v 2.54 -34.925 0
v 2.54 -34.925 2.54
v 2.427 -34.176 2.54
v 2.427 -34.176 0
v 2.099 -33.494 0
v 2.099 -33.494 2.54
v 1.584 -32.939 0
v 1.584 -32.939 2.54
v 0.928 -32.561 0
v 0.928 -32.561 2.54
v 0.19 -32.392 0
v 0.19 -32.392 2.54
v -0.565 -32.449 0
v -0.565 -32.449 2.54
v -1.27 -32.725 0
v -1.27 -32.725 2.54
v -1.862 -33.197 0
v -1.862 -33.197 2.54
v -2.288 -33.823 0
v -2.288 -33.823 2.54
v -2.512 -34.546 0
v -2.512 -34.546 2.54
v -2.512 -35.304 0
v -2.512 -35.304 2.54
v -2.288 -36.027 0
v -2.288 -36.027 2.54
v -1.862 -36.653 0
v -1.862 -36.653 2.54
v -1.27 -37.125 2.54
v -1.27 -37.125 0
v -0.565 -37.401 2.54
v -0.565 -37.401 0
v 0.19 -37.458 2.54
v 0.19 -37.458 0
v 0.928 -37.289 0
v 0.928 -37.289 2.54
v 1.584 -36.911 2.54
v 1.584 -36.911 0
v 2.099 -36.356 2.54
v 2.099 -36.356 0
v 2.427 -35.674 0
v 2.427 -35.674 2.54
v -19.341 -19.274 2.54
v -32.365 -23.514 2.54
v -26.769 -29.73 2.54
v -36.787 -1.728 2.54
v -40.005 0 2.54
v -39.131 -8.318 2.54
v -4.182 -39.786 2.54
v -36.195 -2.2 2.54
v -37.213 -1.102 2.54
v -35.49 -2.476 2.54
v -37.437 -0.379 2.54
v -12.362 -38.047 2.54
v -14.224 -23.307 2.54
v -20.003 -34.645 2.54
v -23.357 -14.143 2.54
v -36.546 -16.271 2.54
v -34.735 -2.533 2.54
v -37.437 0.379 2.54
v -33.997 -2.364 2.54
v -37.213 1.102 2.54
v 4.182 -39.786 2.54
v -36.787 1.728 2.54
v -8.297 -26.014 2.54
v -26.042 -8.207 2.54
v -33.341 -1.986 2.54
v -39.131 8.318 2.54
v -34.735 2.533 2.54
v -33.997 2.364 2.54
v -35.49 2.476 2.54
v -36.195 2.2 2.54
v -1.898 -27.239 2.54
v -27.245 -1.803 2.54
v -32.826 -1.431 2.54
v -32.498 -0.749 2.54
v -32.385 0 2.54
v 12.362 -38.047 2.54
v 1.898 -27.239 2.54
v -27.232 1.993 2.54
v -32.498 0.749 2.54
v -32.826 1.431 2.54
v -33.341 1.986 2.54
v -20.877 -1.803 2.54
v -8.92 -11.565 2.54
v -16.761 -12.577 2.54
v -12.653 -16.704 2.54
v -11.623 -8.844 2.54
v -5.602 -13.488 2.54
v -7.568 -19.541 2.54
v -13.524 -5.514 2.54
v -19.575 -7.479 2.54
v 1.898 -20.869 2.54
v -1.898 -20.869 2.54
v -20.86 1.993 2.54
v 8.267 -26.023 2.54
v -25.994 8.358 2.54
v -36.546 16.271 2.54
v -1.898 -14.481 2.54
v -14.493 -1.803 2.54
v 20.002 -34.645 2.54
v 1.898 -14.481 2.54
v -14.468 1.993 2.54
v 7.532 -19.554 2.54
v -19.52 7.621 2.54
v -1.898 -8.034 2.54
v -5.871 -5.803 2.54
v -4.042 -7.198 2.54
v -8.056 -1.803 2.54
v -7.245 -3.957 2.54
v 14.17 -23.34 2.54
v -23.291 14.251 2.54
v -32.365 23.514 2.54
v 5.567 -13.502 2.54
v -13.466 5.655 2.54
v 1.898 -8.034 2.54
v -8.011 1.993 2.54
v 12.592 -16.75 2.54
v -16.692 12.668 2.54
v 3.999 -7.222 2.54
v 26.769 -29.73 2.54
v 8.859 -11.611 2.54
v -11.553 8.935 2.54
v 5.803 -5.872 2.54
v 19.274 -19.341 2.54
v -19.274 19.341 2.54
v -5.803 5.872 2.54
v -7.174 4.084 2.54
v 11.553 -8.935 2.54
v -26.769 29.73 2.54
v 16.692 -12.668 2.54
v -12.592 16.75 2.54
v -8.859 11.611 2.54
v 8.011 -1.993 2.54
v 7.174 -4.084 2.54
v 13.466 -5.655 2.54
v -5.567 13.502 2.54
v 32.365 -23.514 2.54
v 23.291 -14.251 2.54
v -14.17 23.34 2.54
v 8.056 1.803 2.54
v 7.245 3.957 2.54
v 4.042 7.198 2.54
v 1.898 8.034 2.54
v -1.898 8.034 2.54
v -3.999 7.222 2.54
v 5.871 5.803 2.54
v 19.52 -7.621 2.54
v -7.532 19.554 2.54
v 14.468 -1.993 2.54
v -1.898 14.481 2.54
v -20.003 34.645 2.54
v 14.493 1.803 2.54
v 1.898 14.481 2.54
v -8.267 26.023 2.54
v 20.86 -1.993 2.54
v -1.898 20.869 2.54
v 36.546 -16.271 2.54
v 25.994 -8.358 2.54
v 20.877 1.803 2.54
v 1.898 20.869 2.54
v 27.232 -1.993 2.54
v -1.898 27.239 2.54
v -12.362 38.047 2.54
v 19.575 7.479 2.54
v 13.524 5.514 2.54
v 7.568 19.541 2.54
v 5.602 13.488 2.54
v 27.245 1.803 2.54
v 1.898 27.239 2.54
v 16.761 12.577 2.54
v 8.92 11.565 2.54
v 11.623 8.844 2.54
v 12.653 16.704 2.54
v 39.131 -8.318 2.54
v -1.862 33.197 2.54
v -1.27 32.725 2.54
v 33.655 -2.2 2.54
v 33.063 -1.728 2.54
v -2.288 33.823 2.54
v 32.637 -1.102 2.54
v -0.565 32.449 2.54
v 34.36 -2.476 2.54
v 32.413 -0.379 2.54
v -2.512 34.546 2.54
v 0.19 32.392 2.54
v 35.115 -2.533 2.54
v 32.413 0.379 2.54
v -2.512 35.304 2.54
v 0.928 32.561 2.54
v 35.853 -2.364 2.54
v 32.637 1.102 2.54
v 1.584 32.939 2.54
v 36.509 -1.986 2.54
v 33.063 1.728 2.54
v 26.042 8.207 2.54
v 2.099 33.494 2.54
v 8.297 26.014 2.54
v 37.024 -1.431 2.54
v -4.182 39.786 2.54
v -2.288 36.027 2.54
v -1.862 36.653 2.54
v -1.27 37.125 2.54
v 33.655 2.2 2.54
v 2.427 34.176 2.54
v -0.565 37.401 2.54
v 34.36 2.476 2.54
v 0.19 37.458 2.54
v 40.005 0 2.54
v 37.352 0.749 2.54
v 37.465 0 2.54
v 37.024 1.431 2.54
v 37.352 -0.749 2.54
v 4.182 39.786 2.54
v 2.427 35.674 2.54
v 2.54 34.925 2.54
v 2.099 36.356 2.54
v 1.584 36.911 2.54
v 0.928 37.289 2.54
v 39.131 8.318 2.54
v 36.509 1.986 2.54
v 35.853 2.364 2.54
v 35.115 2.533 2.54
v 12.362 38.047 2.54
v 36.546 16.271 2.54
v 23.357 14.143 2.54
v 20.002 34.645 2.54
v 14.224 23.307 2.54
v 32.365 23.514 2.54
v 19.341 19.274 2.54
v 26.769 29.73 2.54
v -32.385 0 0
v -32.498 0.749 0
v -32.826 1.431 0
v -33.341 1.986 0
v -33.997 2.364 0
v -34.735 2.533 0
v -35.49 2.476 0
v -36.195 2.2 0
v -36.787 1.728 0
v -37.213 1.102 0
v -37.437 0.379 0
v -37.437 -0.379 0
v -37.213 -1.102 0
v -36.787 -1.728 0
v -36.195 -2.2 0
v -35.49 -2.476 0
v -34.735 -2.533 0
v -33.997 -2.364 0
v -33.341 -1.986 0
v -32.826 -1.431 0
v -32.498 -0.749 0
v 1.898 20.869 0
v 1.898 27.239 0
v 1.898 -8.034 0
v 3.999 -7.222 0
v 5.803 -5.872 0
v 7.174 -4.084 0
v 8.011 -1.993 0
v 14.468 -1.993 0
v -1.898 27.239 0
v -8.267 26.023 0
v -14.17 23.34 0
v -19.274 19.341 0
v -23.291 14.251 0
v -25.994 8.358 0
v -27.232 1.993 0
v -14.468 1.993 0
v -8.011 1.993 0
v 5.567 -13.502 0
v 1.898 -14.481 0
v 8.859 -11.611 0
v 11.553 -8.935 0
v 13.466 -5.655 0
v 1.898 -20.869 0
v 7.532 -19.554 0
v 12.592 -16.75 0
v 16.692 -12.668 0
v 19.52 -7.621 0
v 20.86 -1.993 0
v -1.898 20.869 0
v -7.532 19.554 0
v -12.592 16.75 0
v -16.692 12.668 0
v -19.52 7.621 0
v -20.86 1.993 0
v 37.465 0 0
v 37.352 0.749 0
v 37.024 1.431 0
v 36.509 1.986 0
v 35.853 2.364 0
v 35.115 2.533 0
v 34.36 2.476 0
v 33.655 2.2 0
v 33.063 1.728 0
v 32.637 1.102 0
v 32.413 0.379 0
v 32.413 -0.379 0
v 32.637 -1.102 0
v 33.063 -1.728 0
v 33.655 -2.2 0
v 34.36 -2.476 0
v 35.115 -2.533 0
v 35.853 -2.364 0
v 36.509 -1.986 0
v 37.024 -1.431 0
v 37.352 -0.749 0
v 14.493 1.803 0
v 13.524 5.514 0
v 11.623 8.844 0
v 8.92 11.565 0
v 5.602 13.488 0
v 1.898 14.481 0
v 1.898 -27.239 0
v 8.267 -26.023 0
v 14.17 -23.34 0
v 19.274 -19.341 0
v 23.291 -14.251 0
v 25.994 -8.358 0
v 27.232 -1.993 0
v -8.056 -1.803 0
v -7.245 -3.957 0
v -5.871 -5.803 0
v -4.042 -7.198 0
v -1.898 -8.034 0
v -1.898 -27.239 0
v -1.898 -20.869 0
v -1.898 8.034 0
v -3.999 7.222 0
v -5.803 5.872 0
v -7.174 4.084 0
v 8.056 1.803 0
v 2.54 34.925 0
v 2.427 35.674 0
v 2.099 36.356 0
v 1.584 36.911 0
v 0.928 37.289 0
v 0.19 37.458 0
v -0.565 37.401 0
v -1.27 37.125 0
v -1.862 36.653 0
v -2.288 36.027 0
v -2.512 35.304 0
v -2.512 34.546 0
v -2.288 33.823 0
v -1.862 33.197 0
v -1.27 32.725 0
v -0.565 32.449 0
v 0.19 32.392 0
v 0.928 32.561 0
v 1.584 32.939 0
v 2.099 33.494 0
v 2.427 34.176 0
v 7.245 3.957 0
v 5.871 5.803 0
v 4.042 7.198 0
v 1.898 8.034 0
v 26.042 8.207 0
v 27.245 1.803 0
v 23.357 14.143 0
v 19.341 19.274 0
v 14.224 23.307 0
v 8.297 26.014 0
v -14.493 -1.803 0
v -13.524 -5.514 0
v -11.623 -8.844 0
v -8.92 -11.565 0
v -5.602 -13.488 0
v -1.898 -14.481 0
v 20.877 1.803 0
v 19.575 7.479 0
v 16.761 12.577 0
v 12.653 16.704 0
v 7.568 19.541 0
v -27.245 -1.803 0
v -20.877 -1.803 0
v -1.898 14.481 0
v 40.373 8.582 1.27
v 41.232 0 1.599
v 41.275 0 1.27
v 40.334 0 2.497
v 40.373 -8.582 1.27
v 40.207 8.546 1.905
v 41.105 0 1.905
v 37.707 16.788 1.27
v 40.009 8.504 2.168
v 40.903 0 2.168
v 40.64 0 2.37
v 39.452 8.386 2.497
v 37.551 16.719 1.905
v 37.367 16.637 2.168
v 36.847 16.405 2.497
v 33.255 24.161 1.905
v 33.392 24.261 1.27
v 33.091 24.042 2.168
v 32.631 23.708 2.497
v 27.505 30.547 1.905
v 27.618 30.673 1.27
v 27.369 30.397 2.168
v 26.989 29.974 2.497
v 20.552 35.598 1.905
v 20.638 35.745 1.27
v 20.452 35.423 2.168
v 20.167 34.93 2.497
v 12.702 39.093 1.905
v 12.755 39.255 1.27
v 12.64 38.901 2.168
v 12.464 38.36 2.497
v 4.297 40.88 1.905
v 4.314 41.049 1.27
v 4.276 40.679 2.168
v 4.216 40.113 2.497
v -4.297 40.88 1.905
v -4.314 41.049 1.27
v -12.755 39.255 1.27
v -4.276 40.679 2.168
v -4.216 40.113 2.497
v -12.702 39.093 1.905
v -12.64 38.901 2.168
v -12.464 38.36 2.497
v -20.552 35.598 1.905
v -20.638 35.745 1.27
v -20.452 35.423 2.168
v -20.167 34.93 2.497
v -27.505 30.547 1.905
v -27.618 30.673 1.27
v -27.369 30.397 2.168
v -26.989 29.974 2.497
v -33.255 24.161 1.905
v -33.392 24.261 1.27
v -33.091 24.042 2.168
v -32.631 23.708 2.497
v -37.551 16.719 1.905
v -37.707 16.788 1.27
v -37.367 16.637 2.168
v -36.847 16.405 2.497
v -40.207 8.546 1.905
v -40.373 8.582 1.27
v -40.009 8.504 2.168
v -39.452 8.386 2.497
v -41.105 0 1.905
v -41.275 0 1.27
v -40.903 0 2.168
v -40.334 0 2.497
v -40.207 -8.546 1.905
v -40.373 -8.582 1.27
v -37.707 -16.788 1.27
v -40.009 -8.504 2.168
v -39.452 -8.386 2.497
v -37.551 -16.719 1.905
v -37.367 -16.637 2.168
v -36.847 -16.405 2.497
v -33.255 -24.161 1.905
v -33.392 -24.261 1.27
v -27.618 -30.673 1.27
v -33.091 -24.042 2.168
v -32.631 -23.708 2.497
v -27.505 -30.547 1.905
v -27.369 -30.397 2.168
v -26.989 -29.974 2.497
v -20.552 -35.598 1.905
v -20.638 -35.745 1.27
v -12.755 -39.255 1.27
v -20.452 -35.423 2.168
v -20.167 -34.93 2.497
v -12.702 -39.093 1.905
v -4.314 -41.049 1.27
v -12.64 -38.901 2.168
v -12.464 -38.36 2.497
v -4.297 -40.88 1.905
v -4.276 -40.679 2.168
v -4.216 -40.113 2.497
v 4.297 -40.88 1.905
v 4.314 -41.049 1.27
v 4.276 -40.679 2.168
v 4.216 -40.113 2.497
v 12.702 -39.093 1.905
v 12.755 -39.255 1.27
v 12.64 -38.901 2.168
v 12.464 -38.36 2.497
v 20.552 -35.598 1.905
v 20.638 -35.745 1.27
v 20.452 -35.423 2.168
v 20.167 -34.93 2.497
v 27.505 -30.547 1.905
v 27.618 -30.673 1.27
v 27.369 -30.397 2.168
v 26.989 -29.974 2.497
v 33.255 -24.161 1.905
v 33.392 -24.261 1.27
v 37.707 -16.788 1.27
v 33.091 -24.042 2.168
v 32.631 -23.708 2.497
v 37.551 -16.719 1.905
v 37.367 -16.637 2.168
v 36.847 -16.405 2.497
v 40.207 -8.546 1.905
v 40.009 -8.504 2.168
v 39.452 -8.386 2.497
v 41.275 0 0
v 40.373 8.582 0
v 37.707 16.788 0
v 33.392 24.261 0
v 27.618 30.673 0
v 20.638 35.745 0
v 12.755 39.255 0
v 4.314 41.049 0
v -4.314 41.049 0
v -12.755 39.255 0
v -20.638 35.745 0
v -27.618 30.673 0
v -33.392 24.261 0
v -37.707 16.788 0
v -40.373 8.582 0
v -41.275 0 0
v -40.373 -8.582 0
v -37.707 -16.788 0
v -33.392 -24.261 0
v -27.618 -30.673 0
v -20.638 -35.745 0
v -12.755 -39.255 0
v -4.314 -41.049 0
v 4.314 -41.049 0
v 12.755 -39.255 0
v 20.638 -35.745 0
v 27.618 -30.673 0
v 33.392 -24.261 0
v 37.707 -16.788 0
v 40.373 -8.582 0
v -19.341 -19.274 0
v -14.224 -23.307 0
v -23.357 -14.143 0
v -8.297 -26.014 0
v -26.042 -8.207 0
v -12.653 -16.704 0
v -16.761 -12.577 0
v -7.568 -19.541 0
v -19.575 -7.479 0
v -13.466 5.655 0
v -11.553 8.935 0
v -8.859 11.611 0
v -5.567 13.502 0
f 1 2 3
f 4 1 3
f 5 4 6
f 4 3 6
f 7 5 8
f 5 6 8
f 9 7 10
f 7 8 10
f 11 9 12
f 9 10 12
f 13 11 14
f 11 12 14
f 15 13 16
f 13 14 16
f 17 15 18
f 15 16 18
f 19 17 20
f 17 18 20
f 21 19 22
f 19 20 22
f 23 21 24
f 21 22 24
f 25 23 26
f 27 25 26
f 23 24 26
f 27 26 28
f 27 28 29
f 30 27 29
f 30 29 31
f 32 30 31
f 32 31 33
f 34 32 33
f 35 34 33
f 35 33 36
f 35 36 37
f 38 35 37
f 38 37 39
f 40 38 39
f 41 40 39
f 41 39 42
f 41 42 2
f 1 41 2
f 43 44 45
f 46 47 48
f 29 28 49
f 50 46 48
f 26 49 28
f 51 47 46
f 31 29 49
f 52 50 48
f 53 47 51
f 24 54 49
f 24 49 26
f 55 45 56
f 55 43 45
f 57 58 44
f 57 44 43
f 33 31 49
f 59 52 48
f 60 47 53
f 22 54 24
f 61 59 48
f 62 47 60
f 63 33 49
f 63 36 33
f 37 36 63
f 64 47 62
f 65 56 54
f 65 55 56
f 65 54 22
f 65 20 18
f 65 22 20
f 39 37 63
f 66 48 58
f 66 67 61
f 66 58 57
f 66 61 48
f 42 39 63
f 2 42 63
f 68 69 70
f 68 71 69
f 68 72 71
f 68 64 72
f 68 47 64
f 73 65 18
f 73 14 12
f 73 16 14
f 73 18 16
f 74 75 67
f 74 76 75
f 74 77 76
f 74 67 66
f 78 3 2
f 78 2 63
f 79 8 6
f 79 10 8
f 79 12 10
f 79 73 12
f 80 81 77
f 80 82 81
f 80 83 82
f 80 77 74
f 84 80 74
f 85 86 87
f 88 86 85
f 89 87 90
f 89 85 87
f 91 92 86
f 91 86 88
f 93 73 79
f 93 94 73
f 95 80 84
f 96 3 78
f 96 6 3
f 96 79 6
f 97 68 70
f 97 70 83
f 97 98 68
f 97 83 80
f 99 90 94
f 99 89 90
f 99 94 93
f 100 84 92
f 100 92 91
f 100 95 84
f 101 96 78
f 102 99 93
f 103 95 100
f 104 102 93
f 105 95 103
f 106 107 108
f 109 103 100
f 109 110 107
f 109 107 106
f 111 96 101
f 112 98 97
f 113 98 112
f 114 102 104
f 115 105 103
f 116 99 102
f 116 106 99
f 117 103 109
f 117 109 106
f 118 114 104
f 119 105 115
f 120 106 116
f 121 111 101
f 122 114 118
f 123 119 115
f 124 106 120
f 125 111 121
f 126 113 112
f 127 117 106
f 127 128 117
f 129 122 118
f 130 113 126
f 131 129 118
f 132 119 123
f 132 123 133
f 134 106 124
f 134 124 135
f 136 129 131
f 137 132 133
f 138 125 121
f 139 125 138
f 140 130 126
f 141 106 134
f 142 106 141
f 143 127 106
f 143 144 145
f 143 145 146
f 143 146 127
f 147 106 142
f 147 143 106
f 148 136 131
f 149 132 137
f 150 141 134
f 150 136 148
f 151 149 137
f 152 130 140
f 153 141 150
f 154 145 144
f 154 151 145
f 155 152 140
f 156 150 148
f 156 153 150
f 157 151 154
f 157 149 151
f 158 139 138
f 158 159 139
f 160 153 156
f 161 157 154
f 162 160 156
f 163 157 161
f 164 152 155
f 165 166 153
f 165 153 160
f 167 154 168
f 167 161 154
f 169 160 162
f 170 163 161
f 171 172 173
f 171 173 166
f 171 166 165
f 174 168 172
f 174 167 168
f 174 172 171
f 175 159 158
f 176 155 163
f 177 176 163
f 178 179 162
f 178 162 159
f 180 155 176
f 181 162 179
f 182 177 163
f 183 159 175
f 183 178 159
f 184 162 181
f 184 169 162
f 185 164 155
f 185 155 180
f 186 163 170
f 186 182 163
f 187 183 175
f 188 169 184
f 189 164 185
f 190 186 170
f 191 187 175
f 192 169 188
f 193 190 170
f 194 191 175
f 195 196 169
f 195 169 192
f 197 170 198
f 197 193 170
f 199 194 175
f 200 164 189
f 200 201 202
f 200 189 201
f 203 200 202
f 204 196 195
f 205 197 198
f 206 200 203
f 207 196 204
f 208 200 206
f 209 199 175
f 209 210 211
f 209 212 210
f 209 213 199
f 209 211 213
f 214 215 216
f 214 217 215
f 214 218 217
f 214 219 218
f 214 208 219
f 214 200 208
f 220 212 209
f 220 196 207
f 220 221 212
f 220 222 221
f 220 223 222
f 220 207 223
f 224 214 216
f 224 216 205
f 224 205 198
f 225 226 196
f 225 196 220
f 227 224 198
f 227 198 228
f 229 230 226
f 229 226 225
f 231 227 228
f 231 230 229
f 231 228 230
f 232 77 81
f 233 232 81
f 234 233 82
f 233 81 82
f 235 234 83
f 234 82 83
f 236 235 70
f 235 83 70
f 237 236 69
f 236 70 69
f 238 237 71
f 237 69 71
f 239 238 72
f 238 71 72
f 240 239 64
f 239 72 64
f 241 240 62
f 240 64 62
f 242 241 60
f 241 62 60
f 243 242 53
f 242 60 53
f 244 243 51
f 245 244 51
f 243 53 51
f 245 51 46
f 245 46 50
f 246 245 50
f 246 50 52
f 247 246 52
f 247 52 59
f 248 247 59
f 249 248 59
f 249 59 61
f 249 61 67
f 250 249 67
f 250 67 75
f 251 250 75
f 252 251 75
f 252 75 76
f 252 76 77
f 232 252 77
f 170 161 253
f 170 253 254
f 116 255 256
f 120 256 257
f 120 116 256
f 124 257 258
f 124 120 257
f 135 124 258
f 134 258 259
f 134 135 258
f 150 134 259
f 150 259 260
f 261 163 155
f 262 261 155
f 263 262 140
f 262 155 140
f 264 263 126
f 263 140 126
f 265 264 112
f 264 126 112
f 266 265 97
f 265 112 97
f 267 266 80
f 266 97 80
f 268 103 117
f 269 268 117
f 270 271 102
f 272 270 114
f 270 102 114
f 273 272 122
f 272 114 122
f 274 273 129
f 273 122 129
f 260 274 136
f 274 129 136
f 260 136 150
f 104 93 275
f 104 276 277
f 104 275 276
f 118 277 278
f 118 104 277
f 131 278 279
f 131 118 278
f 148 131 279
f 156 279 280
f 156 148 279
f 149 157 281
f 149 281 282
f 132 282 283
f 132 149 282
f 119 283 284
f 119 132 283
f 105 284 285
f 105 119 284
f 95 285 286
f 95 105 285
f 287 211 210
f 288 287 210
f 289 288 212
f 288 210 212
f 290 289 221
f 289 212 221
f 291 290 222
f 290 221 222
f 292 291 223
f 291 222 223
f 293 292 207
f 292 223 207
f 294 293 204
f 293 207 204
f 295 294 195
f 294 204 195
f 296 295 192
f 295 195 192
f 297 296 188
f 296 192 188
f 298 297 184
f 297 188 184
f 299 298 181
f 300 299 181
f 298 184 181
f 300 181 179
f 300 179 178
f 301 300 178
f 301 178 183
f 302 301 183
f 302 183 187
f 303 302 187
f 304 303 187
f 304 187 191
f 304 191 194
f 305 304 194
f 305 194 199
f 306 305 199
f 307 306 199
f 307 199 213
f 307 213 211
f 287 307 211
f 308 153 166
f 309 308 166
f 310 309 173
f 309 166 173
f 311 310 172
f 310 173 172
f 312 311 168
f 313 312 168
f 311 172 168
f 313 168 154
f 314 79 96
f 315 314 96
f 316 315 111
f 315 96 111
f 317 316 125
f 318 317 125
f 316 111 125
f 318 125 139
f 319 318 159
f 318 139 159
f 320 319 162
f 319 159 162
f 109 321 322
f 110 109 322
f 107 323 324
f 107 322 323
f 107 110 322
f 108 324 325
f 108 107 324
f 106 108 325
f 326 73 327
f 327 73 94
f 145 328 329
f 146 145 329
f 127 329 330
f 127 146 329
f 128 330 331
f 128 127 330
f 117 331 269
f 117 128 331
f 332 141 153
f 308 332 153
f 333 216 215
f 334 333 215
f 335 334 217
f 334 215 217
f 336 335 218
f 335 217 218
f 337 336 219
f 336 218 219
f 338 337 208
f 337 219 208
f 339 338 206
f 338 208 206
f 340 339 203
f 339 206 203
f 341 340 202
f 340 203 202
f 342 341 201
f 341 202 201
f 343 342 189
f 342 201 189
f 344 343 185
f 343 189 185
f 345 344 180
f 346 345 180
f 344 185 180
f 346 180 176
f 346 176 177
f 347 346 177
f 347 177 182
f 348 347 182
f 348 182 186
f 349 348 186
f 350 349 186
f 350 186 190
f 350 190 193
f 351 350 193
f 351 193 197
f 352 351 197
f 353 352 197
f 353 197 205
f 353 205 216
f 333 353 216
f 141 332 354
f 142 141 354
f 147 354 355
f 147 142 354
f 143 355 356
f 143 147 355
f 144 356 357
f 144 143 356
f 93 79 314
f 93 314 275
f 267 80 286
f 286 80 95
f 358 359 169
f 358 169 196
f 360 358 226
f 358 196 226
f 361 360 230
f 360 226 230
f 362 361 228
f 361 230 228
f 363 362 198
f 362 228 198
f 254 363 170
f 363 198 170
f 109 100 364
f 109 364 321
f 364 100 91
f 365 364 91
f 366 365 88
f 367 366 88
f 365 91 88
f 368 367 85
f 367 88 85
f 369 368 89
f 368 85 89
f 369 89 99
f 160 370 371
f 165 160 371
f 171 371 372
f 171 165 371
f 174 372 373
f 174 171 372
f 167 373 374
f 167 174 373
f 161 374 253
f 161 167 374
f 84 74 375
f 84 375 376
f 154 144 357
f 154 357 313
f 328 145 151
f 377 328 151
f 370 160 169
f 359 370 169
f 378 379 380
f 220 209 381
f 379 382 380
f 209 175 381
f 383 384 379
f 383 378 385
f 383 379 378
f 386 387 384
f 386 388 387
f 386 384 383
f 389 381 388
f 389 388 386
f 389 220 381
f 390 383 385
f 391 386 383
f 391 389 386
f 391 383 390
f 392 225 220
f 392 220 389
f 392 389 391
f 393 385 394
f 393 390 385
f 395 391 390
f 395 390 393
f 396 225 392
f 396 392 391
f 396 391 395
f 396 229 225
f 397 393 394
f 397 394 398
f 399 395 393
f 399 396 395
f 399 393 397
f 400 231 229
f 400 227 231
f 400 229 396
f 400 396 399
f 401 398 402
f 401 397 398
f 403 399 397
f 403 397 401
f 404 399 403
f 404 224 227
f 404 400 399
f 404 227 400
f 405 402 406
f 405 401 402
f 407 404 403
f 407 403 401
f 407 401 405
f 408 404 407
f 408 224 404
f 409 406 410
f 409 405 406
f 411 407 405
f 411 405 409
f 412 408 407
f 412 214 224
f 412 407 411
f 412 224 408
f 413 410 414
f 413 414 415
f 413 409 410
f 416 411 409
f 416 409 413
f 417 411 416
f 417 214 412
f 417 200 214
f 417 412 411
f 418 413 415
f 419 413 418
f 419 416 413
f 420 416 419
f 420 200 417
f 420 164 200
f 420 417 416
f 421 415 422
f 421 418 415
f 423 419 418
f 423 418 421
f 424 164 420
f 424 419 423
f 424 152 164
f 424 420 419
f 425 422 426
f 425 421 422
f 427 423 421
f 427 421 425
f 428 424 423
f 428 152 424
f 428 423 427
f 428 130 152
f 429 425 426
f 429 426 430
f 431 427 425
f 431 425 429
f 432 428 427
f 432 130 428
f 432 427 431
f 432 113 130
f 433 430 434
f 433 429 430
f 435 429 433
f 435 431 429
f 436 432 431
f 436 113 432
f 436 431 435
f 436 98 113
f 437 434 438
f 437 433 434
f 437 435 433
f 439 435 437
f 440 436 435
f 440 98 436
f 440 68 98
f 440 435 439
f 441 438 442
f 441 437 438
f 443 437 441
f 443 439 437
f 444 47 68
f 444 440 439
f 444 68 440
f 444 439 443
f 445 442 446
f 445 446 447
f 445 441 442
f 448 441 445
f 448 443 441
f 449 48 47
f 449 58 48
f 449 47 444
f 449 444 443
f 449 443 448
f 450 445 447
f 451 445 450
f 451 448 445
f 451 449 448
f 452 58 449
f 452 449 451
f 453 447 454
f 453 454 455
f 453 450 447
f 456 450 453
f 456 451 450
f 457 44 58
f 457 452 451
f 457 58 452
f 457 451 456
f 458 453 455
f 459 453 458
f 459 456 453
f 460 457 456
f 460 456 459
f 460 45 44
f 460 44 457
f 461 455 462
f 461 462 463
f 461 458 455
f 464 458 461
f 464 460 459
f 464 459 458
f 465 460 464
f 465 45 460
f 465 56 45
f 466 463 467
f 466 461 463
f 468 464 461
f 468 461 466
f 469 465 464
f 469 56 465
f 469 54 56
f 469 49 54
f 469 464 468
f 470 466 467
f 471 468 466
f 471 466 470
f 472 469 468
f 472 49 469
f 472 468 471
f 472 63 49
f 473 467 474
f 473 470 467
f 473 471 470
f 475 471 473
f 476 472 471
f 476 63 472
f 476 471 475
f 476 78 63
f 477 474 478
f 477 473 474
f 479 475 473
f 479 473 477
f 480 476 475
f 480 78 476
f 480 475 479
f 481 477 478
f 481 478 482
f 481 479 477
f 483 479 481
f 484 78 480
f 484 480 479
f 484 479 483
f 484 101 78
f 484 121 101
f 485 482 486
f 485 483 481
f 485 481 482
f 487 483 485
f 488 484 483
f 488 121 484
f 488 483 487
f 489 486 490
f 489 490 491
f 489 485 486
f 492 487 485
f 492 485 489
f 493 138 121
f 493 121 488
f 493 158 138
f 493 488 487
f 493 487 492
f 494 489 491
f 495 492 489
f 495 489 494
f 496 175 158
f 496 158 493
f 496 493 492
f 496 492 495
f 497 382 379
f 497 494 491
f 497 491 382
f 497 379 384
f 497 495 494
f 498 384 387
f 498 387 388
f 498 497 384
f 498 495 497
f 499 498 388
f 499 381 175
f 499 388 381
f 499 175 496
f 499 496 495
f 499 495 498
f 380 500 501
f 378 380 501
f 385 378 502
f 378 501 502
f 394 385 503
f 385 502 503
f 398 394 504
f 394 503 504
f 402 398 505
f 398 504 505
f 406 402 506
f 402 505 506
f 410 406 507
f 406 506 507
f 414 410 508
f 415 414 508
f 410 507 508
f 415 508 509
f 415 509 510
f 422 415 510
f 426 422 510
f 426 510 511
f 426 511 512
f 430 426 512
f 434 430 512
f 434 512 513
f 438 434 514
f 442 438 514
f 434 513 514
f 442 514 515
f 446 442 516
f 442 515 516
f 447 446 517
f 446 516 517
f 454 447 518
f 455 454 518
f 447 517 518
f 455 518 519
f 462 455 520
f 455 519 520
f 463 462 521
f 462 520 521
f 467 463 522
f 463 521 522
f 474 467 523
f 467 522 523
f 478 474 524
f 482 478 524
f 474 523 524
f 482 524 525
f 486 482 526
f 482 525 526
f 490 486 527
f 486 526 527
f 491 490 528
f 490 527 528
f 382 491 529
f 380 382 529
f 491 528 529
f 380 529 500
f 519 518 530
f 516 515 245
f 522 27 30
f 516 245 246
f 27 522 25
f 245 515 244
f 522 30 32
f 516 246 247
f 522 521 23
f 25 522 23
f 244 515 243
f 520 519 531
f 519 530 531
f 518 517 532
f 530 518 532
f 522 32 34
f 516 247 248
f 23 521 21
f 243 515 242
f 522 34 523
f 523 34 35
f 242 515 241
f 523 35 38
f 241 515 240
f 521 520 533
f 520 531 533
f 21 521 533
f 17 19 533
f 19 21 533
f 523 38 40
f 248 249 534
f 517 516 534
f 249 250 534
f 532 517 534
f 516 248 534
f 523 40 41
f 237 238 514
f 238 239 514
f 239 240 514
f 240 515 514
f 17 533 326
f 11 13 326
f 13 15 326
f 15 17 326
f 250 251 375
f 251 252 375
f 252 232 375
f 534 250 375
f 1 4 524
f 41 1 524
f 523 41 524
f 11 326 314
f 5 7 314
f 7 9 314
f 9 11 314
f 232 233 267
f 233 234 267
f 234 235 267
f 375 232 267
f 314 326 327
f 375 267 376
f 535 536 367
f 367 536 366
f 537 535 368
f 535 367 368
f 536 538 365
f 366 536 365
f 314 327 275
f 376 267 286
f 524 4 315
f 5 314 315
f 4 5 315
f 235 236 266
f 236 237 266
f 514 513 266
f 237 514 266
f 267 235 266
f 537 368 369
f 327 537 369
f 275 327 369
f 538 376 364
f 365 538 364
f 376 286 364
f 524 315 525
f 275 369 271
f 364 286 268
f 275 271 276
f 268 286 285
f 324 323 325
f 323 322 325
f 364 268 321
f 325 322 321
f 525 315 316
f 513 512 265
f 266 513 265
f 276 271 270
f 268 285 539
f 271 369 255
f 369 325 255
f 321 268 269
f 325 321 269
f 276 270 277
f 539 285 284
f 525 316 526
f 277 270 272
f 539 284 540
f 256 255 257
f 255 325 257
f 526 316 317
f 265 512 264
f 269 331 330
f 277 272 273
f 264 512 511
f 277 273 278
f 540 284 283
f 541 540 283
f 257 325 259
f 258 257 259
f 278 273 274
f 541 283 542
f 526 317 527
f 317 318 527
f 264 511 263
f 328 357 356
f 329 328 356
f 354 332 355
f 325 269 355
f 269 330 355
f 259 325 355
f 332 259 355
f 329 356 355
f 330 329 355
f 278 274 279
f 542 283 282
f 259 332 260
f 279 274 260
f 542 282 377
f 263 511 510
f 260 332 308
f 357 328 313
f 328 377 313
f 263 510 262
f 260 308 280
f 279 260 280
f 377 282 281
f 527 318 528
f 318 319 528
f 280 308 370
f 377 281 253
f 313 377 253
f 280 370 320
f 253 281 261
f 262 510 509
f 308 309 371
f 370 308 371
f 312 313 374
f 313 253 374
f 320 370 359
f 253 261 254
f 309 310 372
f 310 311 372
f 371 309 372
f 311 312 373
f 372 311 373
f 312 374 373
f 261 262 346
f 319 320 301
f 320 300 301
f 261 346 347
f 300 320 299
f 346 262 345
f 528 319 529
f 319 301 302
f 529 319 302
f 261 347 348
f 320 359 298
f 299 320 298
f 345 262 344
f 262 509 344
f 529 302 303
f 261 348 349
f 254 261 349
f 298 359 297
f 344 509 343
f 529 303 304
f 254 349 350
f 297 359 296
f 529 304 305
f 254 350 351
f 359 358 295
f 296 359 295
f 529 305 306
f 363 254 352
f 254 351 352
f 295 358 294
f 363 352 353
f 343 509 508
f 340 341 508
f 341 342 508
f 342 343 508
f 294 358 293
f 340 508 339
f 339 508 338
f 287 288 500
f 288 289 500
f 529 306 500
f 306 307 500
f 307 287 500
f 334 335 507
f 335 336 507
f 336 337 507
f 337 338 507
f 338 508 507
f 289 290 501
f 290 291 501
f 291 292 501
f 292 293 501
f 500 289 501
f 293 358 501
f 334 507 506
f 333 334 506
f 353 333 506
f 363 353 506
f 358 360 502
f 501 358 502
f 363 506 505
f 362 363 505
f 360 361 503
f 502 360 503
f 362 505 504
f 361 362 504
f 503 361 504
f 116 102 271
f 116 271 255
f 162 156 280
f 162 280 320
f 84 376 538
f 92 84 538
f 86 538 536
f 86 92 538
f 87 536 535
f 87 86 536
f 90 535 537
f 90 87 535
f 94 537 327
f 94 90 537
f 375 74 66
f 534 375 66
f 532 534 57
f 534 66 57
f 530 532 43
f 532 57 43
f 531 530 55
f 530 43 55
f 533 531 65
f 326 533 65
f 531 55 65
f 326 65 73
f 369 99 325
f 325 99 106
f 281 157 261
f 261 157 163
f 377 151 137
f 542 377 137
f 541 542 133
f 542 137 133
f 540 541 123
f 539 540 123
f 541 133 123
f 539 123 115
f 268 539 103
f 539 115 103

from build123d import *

# Parameters (mm, degrees)
F0_R      = 41.275
F1_DEPTH  = 2.54
F2_R      = 2.54
F3_DEPTH  = 2.541
F4_R      = 2.54
F5_DEPTH  = 2.541
F6_R      = 2.54
F7_DEPTH  = 2.541
F8_R      = 2.54
F9_DEPTH  = 2.541
F10_R     = 1.27
F11_R     = 27.305
F12_DEPTH = 2.541
F13_R     = 20.955
F14_DEPTH = 2.54
F15_R     = 14.605
F16_DEPTH = 2.541
F17_R     = 8.255
F18_DEPTH = 2.54
F19_W     = 3.796444
F19_H     = 24.866691
F20_DEPTH = 2.54
F21_W     = 24.866692
F21_H     = 3.796442
F22_DEPTH = 2.54
F23_W     = 3.796442
F23_H     = 25.815801
F24_DEPTH = 2.54
F25_W     = 24.86669
F25_H     = 3.796442
F26_DEPTH = 2.54


with BuildPart() as f1:
    # F0 (on Top) → F1 (new body)
    with BuildSketch(Plane.XY):
        Circle(F0_R)
    extrude(amount=F1_DEPTH)

    # F2 (on face) → F3 (cut, through all)
    with BuildSketch(Plane.XY.offset(2.54)):
        with Locations((0, 34.925)):
            Circle(F2_R)
    extrude(amount=-F3_DEPTH, mode=Mode.SUBTRACT)

    # F4 (on face) → F5 (cut, through all)
    with BuildSketch(Plane.XY.offset(2.54)):
        with Locations((0, -34.925)):
            Circle(F4_R)
    extrude(amount=-F5_DEPTH, mode=Mode.SUBTRACT)

    # F6 (on face) → F7 (cut, through all)
    with BuildSketch(Plane.XY.offset(2.54)):
        with Locations((-34.925, 0)):
            Circle(F6_R)
    extrude(amount=-F7_DEPTH, mode=Mode.SUBTRACT)

    # F8 (on face) → F9 (cut, through all)
    with BuildSketch(Plane.XY.offset(2.54)):
        with Locations((34.925, 0)):
            Circle(F8_R)
    extrude(amount=-F9_DEPTH, mode=Mode.SUBTRACT)

    # F10
    f10_edges = [f1.edges().sort_by_distance(p)[0] for p in [
        (-41.275, 0, 2.54),
    ]]
    fillet(f10_edges, radius=F10_R)

    # F11 (on face) → F12 (cut, through all)
    with BuildSketch(Plane.XY.offset(2.54)):
        Circle(F11_R)
    extrude(amount=-F12_DEPTH, mode=Mode.SUBTRACT)



with BuildPart() as f14:
    # F13 (on face) → F14 (new body)
    with BuildSketch(Plane.XY.offset(2.54)):
        Circle(F13_R)
    extrude(amount=-F14_DEPTH)

    # F15 (on face) → F16 (cut, through all)
    with BuildSketch(Plane.XY.offset(2.54)):
        Circle(F15_R)
    extrude(amount=-F16_DEPTH, mode=Mode.SUBTRACT)


with BuildPart() as f18:
    # F17 (on face) → F18 (new body)
    with BuildSketch(Plane.XY.offset(2.54)):
        Circle(F17_R)
    extrude(amount=-F18_DEPTH)


with BuildPart() as f1_1:
    add(f1.part)

    add(f14.part)  # F20 merges F14

    add(f18.part)  # F20 merges F18
    # F19 (on face) → F20 (join)
    with BuildSketch(Plane.XY.offset(2.54)):
        with Locations((0, -17.463631)):
            Rectangle(F19_W, F19_H)
    extrude(amount=-F20_DEPTH)

    # F21 (on face) → F22 (join)
    with BuildSketch(Plane.XY.offset(2.54)):
        with Locations((16.989075, -0.094911)):
            Rectangle(F21_W, F21_H)
    extrude(amount=-F22_DEPTH)

    # F23 (on face) → F24 (join)
    with BuildSketch(Plane.XY.offset(2.54)):
        with Locations((0, 17.178897)):
            Rectangle(F23_W, F23_H)
    extrude(amount=-F24_DEPTH)

    # F25 (on face) → F26 (join)
    with BuildSketch(Plane.XY.offset(2.54)):
        with Locations((-18.128007, 0.094911)):
            Rectangle(F25_W, F25_H)
    extrude(amount=-F26_DEPTH)


solid = f1_1.part
